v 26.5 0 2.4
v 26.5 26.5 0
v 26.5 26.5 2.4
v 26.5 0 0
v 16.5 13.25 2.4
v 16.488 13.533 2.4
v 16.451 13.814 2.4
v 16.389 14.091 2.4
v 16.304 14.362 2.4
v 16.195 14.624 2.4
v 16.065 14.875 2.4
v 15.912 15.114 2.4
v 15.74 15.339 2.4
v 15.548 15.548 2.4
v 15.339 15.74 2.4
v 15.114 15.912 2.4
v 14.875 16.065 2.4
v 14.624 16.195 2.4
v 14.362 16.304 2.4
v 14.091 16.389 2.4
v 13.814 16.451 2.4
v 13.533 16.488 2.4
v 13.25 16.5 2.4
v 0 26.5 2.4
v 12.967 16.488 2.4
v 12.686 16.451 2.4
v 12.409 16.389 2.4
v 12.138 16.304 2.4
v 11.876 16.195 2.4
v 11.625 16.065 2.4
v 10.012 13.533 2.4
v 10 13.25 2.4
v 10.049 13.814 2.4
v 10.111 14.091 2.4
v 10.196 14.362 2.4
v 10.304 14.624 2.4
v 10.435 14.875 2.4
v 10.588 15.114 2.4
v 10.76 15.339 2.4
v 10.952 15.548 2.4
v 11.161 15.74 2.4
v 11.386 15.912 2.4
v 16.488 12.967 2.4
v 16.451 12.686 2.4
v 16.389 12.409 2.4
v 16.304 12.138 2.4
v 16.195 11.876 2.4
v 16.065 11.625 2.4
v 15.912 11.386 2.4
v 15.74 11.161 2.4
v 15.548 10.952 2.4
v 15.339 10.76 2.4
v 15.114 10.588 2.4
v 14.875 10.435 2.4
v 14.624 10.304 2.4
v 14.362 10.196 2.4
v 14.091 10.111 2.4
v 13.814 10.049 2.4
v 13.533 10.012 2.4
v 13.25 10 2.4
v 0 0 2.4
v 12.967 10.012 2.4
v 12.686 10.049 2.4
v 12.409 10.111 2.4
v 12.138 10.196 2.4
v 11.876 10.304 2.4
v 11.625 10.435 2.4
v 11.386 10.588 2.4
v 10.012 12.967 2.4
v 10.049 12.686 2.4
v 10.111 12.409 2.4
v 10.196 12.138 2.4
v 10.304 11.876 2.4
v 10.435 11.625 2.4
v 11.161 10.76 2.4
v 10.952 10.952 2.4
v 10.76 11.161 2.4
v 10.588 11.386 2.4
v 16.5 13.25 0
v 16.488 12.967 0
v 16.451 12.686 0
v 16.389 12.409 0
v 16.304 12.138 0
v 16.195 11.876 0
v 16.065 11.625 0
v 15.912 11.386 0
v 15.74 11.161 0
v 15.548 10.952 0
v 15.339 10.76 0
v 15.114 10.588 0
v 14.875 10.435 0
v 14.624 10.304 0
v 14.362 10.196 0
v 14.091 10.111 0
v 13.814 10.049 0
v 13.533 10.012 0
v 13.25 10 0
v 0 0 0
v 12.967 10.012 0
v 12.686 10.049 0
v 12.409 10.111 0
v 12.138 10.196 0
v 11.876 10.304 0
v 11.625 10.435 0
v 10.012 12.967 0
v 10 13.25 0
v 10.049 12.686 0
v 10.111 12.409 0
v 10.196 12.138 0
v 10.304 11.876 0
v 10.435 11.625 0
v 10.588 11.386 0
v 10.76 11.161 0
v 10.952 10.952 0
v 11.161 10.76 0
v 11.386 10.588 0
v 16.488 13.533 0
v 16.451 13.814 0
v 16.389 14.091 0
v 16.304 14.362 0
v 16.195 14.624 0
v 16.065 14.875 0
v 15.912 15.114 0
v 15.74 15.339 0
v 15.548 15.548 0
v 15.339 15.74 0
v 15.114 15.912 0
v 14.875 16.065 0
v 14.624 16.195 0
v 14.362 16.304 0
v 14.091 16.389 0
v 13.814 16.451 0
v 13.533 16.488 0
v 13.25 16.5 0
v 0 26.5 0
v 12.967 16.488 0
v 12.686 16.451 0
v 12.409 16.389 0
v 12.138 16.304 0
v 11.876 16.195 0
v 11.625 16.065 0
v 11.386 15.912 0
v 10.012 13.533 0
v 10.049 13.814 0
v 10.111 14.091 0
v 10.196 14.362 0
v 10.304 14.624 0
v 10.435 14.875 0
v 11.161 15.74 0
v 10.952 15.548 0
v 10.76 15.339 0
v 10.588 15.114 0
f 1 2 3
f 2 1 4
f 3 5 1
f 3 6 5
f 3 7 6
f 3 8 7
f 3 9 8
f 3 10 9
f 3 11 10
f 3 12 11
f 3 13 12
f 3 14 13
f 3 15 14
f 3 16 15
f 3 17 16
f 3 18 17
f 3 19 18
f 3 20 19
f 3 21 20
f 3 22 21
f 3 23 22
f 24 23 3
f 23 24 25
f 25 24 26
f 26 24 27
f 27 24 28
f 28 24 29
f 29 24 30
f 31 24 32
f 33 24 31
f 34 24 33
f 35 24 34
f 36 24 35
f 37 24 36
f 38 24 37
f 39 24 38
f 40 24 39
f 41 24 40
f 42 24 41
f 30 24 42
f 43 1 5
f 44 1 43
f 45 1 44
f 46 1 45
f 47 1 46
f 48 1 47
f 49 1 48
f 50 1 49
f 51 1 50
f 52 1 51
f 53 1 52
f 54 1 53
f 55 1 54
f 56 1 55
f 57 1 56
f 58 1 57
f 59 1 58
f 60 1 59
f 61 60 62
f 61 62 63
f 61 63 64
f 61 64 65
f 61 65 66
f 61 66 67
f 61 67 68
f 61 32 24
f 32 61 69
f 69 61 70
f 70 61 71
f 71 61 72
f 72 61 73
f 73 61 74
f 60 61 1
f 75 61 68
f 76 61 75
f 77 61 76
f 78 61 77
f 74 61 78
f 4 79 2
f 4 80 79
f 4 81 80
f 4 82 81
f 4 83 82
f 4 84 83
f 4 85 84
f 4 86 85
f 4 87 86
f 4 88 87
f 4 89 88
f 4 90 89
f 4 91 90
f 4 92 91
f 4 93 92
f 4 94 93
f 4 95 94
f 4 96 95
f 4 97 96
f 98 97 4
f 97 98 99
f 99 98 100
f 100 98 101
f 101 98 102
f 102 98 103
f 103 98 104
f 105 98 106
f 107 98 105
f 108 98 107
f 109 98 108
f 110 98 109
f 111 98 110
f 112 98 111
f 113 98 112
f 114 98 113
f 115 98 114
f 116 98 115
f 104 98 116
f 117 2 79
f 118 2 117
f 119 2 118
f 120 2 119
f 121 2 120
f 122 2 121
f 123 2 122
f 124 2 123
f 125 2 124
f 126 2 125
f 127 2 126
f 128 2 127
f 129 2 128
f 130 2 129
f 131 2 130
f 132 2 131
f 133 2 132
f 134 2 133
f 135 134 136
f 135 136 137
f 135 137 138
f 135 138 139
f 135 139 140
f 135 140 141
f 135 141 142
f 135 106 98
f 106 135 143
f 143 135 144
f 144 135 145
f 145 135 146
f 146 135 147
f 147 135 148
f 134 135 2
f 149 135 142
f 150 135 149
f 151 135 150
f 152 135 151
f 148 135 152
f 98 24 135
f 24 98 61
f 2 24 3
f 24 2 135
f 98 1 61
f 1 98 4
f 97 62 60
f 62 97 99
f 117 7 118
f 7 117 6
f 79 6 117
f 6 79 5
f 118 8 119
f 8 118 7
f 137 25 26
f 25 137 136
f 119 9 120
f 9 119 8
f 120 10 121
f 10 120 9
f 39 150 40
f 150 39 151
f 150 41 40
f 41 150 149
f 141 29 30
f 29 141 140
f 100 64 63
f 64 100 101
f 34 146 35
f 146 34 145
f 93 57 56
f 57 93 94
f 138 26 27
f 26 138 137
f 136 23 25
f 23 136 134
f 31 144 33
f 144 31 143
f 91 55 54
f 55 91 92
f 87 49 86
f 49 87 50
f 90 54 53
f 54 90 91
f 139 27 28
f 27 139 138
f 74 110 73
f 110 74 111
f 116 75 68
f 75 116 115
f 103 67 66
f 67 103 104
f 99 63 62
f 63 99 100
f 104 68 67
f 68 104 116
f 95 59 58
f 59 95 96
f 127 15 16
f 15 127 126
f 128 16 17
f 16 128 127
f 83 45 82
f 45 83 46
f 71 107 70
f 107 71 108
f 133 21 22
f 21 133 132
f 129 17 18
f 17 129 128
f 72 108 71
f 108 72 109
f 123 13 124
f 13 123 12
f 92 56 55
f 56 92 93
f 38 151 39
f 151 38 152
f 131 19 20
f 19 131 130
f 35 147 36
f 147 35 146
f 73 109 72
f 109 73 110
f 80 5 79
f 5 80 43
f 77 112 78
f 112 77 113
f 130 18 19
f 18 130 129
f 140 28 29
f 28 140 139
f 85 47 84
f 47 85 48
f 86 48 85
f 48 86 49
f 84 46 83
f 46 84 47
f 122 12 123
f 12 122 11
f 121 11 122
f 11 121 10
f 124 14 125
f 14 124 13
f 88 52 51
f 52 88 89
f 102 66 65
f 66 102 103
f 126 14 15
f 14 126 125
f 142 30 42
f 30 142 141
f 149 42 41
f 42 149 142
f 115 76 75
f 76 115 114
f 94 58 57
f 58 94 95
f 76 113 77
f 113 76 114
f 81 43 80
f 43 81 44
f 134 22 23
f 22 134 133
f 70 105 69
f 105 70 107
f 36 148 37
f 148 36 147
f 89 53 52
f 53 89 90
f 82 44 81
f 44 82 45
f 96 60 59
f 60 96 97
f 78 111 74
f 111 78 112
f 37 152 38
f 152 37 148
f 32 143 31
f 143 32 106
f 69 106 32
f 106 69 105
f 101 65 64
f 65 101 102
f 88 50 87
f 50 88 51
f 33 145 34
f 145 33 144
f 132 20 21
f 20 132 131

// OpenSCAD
// ============================================================================
//  fit_test_sma_wall.scad — SMA interface cutout test plate (enclosure-prep2)
//  Purpose: verify the SMA round-hole diameter against the actual SMA bulkhead
//  connector before cutting the full enclosure. Size is PLACEHOLDER — 待实测.
//
//  Values MUST be kept in sync with the matching parameter block at the top of
//  rough_enclosure_v1.scad (interfaces[4] / interfaces[5]).
//
//  Prints flat, no supports: a flat plate with a round hole through its 2.4 mm
//  thickness. Check an actual SMA bulkhead connector passes through freely.
// ============================================================================

$fn = 72;

// ---- keep in sync with rough_enclosure_v1.scad ----
wall_thickness = 2.4;
sma_d = 6.5;   // SMA bulkhead hole diameter [placeholder, 待实测]
// ------------------------------------------------
margin = 10;

plate_w = sma_d + 2*margin;
plate_h = sma_d + 2*margin;

difference() {
  cube([plate_w, plate_h, wall_thickness]);
  translate([plate_w/2, plate_h/2, -1])
    cylinder(d = sma_d, h = wall_thickness + 2);
}
